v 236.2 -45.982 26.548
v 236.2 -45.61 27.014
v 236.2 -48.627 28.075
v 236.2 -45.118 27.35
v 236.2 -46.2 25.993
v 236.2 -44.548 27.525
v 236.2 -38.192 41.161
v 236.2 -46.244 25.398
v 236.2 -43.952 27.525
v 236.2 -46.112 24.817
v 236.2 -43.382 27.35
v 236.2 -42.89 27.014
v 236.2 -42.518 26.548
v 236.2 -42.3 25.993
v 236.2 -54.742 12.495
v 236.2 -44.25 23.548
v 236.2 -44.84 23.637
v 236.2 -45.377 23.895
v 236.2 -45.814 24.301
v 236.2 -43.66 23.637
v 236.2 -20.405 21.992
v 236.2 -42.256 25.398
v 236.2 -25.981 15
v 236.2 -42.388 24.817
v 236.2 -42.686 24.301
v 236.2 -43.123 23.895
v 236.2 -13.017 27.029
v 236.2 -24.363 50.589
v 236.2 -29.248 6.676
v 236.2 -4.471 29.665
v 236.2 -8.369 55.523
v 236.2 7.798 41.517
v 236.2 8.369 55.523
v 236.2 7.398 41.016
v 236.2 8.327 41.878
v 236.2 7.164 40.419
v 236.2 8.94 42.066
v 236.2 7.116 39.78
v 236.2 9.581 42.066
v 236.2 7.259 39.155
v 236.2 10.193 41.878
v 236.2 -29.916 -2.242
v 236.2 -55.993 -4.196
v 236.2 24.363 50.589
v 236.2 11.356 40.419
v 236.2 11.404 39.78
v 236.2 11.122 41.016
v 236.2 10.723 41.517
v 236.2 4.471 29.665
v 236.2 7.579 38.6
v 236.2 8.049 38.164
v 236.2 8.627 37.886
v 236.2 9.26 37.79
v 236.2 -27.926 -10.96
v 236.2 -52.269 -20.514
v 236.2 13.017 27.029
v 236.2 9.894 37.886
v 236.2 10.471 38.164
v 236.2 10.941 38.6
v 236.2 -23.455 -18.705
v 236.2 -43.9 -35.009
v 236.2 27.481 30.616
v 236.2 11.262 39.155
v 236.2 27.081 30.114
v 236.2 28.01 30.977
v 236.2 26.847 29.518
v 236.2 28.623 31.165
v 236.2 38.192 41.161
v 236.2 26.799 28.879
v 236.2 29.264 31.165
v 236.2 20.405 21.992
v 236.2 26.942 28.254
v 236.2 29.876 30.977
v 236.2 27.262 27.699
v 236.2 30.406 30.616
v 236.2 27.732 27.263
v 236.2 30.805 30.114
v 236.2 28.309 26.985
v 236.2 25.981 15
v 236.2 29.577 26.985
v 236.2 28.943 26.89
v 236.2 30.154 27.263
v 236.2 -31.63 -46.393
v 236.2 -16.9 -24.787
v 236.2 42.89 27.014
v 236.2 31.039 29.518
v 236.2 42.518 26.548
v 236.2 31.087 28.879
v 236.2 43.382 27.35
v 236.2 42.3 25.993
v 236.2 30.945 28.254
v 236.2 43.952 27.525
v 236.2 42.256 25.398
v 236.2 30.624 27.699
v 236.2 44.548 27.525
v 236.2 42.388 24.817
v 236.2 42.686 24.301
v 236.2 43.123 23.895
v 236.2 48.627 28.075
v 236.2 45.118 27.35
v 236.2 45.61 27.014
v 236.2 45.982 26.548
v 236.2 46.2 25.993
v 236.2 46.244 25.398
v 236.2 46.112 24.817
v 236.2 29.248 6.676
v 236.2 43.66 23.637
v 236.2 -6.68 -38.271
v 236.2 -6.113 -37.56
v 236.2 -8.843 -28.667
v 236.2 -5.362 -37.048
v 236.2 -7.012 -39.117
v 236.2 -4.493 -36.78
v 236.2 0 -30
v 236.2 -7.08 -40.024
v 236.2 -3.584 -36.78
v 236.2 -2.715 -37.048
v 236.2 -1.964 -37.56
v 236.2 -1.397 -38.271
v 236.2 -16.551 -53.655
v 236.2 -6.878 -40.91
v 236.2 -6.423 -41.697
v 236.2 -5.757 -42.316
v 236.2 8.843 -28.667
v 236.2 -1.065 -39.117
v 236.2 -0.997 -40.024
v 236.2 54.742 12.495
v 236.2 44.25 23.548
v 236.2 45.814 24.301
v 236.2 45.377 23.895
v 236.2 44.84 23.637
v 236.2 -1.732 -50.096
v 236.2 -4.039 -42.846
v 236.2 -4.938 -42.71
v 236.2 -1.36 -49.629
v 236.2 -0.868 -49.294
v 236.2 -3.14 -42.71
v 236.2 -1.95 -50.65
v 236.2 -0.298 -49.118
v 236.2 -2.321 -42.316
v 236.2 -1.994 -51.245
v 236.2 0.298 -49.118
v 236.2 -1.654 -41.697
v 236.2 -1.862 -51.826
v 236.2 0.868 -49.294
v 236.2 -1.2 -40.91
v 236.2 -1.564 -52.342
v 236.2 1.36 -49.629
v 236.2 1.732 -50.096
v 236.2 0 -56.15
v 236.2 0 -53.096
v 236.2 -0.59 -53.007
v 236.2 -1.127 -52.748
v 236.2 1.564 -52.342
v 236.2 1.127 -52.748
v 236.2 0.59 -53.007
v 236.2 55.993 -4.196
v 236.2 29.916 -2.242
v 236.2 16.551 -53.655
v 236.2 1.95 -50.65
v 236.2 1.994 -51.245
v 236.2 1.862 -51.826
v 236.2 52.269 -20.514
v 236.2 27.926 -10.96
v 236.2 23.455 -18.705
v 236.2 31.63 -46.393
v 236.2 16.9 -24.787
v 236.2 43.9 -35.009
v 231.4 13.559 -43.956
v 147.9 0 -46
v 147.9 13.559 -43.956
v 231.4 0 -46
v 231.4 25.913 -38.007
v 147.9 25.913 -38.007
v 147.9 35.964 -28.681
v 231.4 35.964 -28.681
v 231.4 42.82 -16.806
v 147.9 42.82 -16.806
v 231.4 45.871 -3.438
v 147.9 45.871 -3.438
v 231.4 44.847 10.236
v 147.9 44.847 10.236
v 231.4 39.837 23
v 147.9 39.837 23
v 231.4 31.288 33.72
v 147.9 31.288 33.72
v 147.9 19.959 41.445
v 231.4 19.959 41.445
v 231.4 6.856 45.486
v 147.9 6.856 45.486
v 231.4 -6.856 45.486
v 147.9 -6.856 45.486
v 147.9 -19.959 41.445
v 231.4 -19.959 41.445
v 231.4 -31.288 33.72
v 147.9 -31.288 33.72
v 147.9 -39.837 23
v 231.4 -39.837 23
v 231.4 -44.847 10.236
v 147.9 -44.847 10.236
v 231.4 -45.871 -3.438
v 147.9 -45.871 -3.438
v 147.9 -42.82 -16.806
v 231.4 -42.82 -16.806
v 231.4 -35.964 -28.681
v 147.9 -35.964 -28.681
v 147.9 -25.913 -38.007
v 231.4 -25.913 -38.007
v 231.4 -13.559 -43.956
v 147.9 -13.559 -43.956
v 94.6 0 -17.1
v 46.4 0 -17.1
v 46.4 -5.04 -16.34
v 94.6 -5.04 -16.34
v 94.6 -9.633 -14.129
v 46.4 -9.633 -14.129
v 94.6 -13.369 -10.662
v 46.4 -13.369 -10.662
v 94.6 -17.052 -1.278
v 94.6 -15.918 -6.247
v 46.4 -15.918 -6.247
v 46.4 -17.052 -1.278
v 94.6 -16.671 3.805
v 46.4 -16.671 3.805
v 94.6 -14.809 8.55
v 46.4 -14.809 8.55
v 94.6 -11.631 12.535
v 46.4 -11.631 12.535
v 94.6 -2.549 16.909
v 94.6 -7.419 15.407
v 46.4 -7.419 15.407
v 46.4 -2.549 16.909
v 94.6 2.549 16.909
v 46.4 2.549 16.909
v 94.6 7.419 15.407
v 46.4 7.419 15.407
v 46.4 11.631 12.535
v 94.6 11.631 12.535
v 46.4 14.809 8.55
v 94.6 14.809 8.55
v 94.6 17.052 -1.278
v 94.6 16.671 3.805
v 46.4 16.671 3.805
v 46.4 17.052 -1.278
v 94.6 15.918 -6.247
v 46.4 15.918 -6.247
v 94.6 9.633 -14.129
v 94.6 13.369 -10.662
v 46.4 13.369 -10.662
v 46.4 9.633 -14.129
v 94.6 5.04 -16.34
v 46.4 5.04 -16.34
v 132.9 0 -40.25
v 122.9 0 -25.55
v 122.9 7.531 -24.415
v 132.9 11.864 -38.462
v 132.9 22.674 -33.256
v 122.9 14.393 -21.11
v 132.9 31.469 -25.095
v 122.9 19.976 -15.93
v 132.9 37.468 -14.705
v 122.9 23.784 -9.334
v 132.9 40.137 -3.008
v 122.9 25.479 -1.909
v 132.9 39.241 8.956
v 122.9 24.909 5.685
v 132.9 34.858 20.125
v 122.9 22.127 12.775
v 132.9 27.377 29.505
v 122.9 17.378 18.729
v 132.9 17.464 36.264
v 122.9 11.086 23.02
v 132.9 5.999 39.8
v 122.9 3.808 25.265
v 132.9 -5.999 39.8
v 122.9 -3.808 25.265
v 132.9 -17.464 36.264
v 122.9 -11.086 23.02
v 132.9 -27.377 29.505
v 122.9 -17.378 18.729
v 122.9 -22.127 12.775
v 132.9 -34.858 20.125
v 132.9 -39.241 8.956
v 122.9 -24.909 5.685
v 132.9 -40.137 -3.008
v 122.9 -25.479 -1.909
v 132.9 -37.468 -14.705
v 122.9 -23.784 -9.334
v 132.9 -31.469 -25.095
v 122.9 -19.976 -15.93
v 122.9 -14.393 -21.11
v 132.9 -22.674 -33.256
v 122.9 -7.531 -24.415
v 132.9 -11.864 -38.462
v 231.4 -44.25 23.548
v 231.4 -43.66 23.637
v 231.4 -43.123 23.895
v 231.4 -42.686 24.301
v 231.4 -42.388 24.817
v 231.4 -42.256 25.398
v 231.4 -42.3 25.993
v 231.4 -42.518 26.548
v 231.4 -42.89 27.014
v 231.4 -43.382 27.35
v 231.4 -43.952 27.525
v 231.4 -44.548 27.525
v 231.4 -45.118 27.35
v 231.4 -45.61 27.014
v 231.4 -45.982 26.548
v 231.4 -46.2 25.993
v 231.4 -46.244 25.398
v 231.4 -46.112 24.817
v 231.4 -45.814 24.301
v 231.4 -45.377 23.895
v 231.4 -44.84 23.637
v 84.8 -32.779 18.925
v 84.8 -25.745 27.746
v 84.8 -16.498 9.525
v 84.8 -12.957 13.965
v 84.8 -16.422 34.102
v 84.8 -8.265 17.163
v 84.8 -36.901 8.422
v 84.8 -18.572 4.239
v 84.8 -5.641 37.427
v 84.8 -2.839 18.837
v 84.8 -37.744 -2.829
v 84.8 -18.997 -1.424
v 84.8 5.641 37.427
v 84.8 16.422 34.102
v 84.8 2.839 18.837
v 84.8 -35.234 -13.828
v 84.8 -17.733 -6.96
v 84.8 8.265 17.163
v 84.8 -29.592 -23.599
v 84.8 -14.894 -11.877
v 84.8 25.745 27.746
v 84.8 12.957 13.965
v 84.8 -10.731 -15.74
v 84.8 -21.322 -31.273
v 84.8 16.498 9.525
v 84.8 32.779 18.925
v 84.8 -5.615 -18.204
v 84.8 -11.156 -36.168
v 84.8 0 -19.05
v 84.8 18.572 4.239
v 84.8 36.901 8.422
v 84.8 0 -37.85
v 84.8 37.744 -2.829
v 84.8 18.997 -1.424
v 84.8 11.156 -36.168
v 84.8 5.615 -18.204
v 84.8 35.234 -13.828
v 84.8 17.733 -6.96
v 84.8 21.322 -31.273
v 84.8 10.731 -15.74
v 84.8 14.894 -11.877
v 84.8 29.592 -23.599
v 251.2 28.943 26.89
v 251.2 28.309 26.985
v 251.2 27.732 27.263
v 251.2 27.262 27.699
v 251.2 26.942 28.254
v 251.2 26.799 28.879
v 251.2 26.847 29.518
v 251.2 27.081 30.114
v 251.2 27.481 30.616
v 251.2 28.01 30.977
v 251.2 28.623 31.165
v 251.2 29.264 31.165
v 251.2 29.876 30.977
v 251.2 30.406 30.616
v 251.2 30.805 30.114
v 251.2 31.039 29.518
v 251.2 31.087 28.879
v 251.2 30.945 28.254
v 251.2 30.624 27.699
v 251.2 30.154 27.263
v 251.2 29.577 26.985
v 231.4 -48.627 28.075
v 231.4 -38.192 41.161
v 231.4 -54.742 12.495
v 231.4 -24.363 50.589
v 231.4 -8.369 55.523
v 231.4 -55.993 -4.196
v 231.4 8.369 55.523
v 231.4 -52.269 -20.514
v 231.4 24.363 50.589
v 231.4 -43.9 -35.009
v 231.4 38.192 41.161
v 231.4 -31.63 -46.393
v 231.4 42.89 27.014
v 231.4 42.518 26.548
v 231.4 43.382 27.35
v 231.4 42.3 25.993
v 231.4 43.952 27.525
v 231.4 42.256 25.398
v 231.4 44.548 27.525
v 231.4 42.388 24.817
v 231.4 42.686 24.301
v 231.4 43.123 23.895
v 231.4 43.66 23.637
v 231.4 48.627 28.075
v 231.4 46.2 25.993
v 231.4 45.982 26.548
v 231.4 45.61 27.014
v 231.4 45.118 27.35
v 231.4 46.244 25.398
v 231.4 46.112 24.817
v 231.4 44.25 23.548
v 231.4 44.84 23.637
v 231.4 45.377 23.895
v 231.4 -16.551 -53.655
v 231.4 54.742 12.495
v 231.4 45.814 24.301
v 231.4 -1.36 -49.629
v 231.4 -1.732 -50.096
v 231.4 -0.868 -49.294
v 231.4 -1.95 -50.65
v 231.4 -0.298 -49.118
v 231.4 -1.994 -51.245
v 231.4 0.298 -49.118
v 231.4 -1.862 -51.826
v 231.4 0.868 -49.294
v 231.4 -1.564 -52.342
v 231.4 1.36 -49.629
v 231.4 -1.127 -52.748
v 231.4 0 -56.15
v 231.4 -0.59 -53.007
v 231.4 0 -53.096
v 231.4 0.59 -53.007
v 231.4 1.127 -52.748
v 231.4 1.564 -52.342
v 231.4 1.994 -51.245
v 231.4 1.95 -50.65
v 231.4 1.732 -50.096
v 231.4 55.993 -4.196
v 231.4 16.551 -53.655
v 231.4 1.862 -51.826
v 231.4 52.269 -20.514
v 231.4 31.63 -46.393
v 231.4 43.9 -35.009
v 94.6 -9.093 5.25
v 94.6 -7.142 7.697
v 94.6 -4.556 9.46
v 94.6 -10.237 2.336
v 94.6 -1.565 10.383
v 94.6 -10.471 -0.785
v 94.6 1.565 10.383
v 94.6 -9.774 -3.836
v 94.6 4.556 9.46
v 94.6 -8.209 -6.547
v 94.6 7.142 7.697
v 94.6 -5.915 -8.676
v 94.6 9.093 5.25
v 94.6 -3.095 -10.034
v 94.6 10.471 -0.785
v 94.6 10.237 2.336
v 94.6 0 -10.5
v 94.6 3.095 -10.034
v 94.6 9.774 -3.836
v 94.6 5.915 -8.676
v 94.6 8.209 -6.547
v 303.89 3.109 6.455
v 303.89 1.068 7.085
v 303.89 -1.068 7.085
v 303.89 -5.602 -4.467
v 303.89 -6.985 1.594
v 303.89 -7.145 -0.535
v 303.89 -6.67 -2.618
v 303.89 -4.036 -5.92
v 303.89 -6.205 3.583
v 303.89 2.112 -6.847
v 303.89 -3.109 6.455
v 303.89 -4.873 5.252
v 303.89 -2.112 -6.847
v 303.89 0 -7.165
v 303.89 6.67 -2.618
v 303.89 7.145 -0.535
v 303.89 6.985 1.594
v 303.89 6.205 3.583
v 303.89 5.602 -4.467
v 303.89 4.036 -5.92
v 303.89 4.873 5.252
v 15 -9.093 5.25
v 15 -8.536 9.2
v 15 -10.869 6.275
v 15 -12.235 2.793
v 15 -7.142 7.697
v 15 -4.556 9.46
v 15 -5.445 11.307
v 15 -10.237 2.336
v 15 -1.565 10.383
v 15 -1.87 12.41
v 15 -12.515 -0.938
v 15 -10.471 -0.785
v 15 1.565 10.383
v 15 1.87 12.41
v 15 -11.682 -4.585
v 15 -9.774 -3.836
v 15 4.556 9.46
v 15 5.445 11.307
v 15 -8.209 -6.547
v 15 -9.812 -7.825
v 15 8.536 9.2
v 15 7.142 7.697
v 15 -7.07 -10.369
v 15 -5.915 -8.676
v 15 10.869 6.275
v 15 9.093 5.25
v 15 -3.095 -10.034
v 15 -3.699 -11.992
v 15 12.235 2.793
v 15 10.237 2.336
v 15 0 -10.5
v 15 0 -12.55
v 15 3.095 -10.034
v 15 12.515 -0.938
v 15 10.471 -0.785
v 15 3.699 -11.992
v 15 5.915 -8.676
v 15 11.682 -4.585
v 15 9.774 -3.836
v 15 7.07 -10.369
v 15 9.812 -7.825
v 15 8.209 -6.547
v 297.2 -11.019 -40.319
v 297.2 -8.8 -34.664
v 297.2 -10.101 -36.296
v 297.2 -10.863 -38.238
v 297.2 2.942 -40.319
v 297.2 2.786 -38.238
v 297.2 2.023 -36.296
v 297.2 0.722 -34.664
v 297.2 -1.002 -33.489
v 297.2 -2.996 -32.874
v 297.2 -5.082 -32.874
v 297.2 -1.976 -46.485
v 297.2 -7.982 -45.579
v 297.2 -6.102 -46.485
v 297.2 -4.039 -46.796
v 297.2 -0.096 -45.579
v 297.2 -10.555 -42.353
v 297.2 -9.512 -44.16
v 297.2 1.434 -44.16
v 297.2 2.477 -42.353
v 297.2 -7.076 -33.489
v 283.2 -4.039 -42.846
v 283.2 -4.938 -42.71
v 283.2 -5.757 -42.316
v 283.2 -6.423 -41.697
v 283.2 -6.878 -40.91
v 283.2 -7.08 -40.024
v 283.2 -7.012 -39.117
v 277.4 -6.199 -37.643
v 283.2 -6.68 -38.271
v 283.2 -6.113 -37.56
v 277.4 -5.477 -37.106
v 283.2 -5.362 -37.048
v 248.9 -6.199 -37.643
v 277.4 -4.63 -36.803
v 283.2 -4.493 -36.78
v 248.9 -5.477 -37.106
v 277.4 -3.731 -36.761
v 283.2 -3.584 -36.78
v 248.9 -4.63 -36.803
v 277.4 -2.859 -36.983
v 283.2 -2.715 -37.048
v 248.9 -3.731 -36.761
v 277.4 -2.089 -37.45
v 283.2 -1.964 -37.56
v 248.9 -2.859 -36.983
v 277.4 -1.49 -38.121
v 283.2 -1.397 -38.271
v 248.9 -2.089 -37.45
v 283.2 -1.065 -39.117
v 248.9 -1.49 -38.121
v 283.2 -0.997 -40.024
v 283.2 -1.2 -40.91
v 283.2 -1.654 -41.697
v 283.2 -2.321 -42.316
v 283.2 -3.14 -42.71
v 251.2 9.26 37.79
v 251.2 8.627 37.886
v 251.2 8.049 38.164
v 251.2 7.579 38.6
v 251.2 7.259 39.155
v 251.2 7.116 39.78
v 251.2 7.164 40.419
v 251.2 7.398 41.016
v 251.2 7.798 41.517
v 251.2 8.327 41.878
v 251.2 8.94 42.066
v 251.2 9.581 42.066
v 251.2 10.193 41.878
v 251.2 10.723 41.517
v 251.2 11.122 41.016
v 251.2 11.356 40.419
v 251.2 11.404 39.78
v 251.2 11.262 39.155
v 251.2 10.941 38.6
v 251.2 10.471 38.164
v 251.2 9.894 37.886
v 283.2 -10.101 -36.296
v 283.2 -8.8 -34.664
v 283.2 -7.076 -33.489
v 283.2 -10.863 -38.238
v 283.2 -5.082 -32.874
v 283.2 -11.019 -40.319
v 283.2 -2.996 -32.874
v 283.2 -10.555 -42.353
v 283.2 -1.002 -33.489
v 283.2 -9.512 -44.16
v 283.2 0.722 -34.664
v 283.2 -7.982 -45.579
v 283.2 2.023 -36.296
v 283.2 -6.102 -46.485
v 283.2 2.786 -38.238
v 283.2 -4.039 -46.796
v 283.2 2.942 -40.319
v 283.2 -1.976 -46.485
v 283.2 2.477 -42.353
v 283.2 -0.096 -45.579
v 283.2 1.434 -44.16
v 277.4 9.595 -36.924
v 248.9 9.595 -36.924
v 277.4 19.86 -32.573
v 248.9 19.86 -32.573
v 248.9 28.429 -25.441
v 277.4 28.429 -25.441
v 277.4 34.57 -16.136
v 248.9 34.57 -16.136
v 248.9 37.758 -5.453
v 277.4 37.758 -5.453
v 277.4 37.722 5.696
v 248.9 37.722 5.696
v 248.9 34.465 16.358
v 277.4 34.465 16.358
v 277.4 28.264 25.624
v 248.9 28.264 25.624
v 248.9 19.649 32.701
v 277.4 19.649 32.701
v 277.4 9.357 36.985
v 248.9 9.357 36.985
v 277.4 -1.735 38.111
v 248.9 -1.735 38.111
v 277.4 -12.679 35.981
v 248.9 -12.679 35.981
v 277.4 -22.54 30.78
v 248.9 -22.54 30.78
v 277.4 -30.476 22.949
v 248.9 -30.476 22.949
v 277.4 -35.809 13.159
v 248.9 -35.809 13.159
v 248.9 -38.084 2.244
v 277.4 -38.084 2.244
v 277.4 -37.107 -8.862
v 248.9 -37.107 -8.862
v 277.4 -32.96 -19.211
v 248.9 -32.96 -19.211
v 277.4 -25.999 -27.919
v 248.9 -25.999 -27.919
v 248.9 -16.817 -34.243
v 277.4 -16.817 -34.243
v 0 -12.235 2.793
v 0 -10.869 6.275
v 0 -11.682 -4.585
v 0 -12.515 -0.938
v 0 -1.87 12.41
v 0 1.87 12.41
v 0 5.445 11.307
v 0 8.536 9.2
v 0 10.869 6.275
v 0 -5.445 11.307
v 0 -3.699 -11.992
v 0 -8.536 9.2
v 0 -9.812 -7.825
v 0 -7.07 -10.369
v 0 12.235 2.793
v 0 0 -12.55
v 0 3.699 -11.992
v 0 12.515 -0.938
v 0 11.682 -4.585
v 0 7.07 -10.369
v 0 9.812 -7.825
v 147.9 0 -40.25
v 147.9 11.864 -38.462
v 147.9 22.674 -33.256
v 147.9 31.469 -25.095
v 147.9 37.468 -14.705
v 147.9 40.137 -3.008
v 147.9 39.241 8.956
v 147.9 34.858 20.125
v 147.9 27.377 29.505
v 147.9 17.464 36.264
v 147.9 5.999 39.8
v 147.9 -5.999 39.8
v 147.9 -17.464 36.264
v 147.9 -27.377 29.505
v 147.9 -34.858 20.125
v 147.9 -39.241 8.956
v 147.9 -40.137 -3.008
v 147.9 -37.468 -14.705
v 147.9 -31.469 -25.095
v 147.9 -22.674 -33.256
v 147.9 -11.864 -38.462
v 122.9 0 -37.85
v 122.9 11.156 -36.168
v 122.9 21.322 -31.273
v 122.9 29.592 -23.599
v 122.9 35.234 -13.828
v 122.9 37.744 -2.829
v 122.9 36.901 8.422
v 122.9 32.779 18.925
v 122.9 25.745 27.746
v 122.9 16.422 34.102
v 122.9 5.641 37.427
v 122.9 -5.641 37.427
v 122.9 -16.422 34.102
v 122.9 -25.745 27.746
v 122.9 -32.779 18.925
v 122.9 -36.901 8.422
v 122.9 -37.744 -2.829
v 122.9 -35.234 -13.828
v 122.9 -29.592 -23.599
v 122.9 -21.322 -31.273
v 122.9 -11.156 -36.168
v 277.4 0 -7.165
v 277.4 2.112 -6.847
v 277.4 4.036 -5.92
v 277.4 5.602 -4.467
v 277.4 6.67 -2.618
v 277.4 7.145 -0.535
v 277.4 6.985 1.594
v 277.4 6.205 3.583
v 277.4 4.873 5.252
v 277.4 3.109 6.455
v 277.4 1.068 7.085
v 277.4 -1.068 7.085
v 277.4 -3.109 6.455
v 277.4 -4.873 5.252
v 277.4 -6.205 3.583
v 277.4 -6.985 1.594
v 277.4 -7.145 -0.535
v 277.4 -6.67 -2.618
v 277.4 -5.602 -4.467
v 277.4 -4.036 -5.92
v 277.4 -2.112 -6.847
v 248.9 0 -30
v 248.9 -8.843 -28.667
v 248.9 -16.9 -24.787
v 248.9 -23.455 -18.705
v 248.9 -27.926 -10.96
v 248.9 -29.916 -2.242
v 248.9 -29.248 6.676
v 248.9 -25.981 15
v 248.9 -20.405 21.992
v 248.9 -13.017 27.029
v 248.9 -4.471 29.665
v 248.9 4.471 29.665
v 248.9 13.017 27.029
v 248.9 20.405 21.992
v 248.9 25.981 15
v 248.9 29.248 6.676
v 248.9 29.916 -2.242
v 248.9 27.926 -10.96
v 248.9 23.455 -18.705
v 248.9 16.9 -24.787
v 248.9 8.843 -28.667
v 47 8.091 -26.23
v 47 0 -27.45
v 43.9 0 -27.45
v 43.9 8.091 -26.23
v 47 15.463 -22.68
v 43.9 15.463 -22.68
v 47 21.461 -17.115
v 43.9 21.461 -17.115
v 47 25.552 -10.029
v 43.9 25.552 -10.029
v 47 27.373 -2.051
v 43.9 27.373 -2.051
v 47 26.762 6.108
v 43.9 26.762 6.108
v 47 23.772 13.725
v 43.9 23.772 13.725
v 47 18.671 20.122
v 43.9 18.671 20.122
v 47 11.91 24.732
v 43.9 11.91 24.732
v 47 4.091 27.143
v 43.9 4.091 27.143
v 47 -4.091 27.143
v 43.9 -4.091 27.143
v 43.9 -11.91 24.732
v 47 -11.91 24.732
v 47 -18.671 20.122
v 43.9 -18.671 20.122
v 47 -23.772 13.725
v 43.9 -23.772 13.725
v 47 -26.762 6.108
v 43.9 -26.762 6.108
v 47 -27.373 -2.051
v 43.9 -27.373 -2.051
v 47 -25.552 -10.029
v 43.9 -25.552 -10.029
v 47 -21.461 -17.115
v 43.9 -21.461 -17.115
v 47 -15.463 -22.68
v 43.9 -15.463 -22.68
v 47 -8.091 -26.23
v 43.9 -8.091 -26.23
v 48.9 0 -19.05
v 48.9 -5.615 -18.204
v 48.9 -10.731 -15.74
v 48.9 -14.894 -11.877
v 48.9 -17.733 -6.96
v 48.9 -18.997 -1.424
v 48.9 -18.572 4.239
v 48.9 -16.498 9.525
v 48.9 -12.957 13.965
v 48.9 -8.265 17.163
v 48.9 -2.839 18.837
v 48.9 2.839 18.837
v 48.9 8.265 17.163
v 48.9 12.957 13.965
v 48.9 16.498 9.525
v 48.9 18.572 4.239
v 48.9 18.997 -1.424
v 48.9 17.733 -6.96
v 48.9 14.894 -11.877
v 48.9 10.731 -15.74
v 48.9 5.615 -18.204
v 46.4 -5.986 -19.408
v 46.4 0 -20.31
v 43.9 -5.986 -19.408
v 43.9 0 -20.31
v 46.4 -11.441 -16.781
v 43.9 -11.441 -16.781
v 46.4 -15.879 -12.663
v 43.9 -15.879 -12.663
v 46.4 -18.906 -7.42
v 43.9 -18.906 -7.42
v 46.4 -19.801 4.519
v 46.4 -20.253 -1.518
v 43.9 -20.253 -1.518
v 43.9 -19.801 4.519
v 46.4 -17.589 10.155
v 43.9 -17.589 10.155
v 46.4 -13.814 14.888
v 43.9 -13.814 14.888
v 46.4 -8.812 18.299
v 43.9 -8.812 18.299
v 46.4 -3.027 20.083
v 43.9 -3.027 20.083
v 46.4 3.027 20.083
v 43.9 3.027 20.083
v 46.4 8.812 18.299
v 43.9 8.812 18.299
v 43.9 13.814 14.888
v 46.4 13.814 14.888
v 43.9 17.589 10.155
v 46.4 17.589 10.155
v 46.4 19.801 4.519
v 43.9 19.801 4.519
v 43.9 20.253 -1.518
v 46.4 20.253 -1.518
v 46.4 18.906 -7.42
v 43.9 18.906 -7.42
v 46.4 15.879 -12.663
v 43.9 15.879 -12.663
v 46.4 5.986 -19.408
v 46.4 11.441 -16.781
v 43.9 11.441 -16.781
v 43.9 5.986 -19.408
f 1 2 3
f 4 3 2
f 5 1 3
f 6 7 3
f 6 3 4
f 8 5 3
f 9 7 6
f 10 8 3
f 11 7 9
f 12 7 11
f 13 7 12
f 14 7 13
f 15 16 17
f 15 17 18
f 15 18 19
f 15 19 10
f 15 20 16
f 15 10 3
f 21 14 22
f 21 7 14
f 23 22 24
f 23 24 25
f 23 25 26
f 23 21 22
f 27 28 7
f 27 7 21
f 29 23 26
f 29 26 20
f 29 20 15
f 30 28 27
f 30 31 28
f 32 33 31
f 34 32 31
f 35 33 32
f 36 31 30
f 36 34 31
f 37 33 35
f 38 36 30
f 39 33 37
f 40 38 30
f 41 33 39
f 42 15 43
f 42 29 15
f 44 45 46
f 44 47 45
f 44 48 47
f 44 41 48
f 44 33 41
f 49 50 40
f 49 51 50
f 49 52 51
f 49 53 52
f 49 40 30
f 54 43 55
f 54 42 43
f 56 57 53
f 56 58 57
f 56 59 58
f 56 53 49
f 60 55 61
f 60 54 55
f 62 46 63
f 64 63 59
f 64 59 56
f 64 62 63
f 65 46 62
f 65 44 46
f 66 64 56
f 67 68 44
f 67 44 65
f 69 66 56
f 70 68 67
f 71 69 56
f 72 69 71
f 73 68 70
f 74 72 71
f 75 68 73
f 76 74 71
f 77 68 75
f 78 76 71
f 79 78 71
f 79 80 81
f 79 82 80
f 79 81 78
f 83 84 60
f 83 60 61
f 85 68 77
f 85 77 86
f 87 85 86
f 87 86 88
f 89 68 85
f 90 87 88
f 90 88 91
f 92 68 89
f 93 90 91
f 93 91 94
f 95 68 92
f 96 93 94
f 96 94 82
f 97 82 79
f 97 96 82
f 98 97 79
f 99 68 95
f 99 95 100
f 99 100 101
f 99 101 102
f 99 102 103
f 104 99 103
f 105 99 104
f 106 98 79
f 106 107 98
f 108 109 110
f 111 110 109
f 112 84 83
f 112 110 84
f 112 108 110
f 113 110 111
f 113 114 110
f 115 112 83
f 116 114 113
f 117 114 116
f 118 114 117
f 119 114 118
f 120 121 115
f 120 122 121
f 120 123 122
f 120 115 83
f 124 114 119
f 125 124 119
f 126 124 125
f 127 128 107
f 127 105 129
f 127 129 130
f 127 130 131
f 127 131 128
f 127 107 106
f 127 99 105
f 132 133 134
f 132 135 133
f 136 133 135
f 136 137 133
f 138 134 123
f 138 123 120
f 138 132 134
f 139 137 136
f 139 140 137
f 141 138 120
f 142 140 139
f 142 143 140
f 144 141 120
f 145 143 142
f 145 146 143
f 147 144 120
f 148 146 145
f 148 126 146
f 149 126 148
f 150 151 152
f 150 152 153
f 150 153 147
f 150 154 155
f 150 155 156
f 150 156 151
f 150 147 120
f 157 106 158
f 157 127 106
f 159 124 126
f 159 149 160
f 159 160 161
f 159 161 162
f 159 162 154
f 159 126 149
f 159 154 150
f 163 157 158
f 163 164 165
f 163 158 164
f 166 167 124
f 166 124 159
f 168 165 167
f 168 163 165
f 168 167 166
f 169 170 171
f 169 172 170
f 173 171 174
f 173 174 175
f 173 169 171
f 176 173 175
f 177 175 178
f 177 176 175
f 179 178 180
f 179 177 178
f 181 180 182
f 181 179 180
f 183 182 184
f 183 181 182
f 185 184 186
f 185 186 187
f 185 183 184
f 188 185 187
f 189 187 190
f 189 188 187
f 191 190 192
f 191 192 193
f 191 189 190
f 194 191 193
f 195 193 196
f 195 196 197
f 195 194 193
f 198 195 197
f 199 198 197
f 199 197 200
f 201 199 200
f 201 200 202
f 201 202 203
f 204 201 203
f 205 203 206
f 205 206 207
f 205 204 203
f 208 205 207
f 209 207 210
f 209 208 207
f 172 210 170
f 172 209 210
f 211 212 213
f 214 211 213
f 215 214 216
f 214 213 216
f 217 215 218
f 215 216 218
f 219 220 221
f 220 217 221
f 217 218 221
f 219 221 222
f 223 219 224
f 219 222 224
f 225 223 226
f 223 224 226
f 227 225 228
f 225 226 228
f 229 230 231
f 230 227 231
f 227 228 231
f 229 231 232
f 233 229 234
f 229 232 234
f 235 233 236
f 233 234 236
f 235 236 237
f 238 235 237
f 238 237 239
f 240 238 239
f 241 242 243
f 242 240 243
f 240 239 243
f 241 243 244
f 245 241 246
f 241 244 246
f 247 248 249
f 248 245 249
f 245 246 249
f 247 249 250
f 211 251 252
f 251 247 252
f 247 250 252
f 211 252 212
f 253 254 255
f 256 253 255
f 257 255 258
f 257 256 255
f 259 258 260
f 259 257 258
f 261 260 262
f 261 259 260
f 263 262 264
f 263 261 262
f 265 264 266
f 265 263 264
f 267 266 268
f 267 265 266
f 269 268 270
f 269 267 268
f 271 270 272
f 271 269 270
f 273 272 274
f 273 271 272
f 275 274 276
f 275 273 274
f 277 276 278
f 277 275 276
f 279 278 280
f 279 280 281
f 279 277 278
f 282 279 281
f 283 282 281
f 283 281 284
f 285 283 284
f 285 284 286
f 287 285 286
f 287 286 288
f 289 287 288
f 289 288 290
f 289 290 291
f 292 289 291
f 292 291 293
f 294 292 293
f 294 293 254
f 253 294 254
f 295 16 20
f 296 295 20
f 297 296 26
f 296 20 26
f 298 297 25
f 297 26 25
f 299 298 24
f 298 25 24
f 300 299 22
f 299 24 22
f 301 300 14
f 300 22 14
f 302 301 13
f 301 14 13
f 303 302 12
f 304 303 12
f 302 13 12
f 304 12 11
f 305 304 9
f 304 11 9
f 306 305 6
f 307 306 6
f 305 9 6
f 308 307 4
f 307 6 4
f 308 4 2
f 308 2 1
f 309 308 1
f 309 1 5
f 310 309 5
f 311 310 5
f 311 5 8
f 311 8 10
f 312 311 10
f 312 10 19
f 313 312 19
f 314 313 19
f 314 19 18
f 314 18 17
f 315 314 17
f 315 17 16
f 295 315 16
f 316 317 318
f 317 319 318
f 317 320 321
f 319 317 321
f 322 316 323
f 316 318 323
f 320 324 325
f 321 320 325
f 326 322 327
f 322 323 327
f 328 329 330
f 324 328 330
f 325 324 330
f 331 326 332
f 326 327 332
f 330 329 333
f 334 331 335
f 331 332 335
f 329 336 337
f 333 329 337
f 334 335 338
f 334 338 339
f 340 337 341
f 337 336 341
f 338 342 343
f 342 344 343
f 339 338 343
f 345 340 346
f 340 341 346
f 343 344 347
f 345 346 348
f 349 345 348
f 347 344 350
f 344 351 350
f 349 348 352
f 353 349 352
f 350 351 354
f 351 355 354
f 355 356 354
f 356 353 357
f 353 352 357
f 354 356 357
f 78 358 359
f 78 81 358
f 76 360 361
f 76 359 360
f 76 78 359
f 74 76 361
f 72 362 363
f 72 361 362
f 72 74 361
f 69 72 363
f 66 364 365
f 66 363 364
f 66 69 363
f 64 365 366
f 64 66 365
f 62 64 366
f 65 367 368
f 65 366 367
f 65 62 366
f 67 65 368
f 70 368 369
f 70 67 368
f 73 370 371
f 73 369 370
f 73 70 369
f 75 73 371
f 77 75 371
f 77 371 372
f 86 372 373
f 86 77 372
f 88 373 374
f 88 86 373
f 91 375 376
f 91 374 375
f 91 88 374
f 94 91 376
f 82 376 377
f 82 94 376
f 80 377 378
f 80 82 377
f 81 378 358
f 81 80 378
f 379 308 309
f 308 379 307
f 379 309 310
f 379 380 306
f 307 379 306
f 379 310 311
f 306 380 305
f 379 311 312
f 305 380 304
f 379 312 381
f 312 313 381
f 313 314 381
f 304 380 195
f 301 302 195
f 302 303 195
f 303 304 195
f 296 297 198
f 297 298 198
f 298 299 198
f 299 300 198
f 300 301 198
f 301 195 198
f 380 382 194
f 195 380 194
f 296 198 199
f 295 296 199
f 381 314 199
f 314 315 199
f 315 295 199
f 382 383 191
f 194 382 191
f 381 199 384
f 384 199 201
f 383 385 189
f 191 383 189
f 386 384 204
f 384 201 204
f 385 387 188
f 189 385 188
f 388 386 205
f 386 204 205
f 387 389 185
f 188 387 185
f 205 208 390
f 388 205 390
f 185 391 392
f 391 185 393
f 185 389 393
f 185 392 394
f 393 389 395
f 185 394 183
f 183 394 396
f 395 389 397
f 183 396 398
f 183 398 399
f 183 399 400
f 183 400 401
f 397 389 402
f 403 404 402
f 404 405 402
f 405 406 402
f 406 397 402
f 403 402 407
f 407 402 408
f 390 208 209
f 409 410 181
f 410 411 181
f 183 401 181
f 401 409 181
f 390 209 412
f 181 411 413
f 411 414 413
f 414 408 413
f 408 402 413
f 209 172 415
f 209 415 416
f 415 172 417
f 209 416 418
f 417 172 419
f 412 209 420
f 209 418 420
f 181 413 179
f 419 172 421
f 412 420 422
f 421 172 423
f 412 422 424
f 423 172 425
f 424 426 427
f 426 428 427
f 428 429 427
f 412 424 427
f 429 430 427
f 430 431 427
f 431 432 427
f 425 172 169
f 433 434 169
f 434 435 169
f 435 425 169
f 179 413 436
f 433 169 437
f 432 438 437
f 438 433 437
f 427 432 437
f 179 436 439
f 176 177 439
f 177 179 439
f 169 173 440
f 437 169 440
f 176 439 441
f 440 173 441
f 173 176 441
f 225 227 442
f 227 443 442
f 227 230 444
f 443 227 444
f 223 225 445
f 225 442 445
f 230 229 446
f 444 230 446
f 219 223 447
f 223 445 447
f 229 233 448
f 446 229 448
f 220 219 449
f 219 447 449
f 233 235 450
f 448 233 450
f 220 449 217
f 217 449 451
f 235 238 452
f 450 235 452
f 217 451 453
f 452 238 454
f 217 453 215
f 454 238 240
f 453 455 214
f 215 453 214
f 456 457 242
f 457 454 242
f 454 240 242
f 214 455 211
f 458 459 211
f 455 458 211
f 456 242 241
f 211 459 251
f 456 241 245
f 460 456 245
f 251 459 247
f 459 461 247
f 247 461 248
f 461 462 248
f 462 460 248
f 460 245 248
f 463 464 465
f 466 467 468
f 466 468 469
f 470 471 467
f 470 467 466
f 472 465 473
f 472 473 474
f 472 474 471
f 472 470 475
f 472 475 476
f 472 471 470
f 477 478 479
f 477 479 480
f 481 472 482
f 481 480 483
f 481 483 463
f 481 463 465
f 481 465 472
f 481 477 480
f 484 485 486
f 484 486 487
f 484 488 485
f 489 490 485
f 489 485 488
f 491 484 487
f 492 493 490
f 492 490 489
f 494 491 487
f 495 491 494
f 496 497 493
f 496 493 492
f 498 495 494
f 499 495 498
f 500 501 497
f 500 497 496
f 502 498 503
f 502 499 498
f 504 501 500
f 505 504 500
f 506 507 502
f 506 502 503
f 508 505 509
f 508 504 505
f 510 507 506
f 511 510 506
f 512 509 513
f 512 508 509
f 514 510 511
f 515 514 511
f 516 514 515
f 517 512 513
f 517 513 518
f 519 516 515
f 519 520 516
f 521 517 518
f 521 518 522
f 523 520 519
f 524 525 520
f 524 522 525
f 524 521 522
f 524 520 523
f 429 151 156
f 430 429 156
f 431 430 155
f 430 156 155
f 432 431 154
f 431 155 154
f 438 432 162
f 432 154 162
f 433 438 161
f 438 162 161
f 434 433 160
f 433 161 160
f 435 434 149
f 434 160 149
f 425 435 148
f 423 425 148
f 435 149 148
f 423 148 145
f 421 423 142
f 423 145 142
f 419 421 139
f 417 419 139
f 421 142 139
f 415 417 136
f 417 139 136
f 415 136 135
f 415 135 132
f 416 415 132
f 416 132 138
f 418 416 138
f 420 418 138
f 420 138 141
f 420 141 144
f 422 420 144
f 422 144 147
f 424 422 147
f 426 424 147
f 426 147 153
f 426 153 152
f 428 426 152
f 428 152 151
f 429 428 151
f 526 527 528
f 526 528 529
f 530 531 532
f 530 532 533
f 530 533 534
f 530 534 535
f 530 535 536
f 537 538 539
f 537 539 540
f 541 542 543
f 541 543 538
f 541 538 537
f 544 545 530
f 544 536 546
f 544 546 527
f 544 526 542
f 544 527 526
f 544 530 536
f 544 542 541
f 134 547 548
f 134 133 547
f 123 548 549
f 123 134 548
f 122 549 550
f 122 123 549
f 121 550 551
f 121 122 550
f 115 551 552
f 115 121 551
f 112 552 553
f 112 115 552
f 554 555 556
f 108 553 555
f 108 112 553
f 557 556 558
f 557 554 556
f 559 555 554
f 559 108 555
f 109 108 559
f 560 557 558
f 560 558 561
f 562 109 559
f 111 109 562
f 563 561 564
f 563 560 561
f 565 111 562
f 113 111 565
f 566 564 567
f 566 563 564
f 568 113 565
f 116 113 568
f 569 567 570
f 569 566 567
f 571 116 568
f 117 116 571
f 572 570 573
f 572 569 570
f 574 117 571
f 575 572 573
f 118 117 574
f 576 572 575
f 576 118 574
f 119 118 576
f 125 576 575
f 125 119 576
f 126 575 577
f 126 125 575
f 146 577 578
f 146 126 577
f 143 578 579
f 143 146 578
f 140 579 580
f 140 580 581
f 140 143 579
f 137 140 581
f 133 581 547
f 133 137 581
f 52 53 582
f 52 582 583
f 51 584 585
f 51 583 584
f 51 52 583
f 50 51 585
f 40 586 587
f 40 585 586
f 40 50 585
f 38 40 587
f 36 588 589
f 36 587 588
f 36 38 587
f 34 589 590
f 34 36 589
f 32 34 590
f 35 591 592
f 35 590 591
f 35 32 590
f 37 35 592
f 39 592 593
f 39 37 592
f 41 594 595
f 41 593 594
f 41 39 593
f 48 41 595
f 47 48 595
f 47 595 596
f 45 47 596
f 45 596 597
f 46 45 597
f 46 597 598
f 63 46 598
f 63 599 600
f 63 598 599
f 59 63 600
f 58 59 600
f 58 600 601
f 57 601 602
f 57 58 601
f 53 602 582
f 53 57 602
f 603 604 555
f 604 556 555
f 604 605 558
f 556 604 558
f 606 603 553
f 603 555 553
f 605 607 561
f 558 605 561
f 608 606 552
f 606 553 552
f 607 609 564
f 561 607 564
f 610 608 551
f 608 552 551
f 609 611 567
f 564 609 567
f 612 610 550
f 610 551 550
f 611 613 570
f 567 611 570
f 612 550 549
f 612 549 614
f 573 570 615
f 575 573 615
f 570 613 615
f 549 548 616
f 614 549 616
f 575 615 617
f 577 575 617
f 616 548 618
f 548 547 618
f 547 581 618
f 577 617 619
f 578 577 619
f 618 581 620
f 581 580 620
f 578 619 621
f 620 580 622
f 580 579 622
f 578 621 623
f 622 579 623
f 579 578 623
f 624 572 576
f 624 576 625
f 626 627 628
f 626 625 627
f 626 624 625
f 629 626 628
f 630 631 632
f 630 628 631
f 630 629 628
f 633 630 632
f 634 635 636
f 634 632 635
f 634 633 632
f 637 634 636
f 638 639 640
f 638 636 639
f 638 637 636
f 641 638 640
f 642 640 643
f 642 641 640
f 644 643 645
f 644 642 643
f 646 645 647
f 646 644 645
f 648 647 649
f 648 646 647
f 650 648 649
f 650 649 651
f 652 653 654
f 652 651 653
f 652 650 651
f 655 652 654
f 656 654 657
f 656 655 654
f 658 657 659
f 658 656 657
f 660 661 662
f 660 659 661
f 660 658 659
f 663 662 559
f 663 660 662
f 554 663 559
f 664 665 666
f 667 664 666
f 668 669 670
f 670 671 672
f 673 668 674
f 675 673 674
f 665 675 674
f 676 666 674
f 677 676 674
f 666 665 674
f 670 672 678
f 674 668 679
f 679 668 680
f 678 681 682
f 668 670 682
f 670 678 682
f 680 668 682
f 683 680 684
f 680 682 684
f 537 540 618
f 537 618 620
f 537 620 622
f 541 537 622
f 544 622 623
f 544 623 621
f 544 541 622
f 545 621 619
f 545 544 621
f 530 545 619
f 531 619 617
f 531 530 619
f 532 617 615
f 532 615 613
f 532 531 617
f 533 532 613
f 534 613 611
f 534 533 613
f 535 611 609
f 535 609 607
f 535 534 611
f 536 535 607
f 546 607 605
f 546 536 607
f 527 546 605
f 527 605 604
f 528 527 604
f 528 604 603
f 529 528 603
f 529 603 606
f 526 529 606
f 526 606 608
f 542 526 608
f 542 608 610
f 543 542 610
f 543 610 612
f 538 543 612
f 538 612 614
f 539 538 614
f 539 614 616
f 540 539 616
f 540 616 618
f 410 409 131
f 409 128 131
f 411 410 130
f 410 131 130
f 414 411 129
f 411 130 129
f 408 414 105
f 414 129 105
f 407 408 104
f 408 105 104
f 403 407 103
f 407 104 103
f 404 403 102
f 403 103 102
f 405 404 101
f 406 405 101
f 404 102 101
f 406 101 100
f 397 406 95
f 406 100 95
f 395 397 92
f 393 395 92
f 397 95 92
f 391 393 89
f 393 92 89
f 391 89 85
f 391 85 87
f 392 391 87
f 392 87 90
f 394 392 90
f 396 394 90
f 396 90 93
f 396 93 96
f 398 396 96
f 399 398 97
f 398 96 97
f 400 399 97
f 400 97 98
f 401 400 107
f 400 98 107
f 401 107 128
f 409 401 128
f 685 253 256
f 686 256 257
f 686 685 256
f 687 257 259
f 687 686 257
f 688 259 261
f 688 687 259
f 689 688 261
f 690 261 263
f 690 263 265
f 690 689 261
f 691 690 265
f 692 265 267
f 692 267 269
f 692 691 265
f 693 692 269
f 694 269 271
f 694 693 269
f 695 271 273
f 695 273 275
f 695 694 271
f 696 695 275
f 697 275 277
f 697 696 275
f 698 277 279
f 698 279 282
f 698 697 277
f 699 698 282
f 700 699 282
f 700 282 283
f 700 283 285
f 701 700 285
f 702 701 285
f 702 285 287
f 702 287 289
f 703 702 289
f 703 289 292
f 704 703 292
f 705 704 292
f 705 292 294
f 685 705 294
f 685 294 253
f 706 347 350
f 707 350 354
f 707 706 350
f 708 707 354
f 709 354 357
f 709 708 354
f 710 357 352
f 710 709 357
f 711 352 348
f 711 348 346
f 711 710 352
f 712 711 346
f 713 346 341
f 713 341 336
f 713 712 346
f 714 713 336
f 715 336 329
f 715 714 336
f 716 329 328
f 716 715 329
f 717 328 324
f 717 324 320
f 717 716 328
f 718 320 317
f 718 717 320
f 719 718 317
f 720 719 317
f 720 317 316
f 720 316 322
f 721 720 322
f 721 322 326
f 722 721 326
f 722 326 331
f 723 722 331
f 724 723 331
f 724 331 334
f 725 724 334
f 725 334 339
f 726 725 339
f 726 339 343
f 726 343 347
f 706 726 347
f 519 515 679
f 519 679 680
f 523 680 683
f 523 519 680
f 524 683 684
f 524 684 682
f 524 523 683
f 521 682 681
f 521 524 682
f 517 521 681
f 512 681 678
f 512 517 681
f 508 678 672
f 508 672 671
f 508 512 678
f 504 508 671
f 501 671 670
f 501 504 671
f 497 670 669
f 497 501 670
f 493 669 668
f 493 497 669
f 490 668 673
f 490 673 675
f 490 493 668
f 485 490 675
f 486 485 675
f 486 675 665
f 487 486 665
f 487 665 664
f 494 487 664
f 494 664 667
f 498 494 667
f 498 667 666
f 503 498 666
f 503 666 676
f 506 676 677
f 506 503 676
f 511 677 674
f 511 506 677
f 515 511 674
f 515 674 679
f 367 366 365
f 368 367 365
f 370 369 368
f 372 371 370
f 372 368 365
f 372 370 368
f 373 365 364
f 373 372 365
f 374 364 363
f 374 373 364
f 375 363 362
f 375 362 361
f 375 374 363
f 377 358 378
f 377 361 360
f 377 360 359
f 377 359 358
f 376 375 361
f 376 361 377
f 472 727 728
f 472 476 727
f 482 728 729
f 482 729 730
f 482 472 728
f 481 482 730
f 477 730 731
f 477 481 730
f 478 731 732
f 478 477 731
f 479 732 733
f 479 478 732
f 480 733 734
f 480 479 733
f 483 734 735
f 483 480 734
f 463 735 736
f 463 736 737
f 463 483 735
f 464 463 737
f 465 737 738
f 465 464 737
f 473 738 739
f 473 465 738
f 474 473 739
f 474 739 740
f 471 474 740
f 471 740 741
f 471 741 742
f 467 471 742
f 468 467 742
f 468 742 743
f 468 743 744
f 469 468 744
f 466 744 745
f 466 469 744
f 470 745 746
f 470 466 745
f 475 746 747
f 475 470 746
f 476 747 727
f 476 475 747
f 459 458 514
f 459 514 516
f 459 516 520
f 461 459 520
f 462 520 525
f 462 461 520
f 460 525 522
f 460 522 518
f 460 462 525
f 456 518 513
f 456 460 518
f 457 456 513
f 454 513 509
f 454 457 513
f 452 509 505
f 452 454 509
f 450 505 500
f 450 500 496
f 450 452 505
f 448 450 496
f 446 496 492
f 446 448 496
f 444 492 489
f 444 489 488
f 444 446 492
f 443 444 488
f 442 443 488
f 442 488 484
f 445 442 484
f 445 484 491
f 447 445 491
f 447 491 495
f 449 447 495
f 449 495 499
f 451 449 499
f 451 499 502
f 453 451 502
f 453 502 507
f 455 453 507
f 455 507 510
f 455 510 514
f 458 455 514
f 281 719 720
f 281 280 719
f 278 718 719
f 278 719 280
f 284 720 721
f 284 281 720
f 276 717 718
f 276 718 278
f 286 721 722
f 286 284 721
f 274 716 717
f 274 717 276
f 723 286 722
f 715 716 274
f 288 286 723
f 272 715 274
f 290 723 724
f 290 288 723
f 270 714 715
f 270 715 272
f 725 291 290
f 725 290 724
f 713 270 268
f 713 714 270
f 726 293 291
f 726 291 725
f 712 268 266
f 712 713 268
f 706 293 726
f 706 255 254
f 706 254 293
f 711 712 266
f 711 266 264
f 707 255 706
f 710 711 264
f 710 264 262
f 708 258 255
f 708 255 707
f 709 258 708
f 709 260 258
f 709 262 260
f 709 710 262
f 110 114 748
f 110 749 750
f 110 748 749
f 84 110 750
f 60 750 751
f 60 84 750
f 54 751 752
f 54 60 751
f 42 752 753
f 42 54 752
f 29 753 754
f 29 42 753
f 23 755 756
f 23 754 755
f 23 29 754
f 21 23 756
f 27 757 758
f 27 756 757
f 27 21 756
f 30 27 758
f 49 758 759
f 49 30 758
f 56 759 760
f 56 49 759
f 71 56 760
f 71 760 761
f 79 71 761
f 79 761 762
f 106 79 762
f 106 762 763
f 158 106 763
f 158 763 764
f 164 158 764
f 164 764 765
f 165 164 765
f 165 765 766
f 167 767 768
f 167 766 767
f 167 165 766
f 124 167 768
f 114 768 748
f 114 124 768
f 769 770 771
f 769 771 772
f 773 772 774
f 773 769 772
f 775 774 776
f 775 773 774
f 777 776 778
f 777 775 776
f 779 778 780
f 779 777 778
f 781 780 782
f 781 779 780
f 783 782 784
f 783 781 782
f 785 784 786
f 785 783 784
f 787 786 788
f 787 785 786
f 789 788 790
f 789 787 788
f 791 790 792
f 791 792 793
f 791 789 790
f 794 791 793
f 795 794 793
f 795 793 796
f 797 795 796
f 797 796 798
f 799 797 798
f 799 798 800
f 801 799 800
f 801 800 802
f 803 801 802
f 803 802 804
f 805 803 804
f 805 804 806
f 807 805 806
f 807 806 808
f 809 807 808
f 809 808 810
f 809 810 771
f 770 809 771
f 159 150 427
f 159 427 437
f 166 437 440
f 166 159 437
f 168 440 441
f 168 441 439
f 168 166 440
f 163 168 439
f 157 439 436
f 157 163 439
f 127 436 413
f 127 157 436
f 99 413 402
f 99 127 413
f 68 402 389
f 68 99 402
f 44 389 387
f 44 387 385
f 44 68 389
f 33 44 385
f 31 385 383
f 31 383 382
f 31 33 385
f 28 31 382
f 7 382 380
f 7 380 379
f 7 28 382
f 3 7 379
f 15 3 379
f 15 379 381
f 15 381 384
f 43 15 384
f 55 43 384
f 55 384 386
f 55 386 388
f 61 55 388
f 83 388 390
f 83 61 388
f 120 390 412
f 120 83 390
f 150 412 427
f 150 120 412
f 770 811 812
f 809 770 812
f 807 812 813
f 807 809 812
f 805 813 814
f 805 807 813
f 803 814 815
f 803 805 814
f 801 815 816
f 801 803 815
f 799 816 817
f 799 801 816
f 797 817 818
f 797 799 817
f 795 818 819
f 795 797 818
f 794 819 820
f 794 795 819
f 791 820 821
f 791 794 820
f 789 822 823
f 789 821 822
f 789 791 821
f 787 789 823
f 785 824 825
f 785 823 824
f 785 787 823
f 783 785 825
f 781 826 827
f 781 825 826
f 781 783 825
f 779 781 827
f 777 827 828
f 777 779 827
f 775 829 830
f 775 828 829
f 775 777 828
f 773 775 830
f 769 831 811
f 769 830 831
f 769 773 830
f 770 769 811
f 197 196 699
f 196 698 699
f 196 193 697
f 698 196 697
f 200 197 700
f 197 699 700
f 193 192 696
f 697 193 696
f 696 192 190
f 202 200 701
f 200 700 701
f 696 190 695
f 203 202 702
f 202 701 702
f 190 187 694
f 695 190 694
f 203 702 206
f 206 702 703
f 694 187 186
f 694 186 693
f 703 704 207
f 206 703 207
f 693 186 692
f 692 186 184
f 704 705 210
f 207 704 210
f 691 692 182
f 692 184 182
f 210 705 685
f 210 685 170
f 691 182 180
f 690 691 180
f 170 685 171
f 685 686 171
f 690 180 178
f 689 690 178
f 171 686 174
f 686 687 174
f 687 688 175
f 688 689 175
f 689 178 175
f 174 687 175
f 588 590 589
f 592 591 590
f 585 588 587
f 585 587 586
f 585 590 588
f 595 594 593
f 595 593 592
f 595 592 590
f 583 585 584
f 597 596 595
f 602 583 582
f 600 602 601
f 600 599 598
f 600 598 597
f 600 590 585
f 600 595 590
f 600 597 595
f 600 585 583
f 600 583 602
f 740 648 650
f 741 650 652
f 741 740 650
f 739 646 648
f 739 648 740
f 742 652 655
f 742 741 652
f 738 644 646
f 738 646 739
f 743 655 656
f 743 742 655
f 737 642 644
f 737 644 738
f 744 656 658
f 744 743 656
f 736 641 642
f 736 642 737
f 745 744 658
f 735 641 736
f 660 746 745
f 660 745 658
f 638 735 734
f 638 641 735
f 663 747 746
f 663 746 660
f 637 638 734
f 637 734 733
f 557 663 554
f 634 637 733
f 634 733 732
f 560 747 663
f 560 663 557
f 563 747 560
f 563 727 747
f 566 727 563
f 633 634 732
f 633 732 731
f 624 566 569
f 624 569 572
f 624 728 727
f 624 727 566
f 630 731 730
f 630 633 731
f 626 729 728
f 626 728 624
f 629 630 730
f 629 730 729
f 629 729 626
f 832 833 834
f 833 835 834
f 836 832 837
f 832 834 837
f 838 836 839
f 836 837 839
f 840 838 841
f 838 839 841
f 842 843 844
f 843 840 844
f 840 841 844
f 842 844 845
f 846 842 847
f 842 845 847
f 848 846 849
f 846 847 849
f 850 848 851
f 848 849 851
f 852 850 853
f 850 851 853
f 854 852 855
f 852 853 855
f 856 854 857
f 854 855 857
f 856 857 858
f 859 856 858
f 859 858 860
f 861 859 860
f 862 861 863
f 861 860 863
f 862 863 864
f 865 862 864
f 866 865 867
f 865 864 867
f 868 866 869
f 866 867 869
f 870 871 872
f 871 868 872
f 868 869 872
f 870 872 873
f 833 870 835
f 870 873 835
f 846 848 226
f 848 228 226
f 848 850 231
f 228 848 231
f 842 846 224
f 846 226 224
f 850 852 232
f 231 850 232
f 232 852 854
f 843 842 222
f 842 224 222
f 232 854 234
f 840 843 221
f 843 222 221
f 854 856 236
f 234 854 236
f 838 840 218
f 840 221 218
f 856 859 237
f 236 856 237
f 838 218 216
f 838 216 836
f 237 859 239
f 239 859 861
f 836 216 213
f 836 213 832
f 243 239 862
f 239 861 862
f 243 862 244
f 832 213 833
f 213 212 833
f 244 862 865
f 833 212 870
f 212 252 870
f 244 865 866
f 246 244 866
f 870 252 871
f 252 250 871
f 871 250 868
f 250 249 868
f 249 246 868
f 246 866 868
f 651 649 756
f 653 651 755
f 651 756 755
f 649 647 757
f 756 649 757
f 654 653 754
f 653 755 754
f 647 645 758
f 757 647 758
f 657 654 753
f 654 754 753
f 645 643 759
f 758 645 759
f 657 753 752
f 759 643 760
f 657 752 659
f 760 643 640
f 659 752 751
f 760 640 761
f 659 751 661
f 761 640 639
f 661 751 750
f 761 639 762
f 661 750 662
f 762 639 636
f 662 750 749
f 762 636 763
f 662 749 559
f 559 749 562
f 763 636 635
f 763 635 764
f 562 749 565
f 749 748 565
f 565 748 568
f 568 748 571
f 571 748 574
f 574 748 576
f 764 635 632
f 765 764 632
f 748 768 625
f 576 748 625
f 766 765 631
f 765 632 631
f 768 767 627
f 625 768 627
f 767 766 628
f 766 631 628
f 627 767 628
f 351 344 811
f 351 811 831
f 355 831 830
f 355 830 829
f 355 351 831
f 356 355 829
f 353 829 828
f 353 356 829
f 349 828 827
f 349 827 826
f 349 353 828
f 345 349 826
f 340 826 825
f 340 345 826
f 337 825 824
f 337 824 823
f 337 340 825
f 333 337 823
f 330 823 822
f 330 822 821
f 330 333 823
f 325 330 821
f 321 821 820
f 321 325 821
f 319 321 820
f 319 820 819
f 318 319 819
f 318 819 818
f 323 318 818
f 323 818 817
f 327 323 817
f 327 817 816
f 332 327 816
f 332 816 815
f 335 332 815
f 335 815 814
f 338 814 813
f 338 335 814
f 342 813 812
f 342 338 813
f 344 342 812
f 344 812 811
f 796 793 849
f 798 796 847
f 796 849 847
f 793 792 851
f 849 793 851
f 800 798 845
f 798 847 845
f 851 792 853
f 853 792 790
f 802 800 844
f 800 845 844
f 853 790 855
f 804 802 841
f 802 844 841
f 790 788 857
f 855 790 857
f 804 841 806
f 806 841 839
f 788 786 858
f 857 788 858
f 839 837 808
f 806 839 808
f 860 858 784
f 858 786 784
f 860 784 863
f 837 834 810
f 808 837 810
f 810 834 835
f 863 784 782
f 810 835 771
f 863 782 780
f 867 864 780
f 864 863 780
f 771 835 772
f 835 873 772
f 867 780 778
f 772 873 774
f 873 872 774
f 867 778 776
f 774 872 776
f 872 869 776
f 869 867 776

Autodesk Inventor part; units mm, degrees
ref_plane "YZ Plane" through (0, 0, 0) normal (1, 0, 0) x (0, 1, 0)
ref_plane "XZ Plane" through (0, 0, 0) normal (0, 1, 0) x (-1, 0, 0)
ref_plane "XY Plane" through (0, 0, 0) normal (0, 0, 1) x (1, 0, 0)
sketch "Sketch1" plane through (0, 0, 0) normal (0, 1, 0) x (-1, 0, 0)
  line L0 (0, 0) -> (-303.89, 0)
  line L1 (0, 0) -> (0, -10.5)
  line L2 (0, -10.5) -> (-94.6, -10.5)
  line L3 (-94.6, -10.5) -> (-94.6, -17.1)
  line L4 (-94.6, -17.1) -> (-46.4, -17.1)
  line L5 (-46.4, -17.1) -> (-46.4, -20.31)
  line L6 (-46.4, -20.31) -> (-43.9, -20.31)
  line L7 (-43.9, -20.31) -> (-43.9, -27.45)
  line L8 (-43.9, -27.45) -> (-47, -27.45)
  line L9 (-47, -27.45) -> (-48.9, -19.05)
  line L10 (-48.9, -19.05) -> (-84.8, -19.05)
  line L11 (-84.8, -19.05) -> (-84.8, -37.85)
  line L12 (-84.8, -37.85) -> (-122.9, -37.85)
  line L13 (-122.9, -37.85) -> (-122.9, -25.55)
  line L14 (-122.9, -25.55) -> (-132.9, -40.25)
  line L15 (-132.9, -40.25) -> (-132.9, -40.25)
  line L16 (-132.9, -40.25) -> (-147.9, -40.25)
  line L17 (-147.9, -40.25) -> (-147.9, -46)
  line L18 (-147.9, -46) -> (-150, -46)
  line L19 (-150, -46) -> (-150, -46)
  line L20 (-150, -46) -> (-231.4, -46)
  line L21 (-231.4, -46) -> (-231.4, -56.15)
  line L22 (-231.4, -56.15) -> (-236.2, -56.15)
  line L23 (-236.2, -56.15) -> (-236.2, 0)
  line L24 (-248.9, 0) -> (-248.9, -38.15)
  line L25 (-248.9, -38.15) -> (-277.4, -38.15)
  line L26 (-277.4, -38.15) -> (-277.4, -7.165)
  line L27 (-277.4, -7.165) -> (-303.89, -7.165)
  line L28 (-303.89, -7.165) -> (-303.89, 0)
  line L29 (0, -10.5) -> (0, -12.55)
  line L30 (0, -12.55) -> (-15, -12.55)
  line L31 (-15, -12.55) -> (-15, -10.5)
  line L32 (-236.2, 0) -> (-248.9, 0)
  line L33 (-248.9, 0) -> (-248.9, -30)
  line L34 (-248.9, -30) -> (-236.2, -30)
  line L35 (-236.2, -30) -> (-236.2, 0)
  dimension "d0" = 303.89
  dimension "d1" = 10.5
  dimension "d2" = 94.6
  dimension "d3" = 6.6
  dimension "d4" = 48.2
  dimension "d5" = 3.21
  dimension "d6" = 2.5
  dimension "d7" = 27.45
  dimension "d8" = 3.1
  dimension "d9" = 5
  dimension "d10" = 19.05
  dimension "d11" = 37.8
  dimension "d12" = 37.85
  dimension "d13" = 38.1
  dimension "d14" = 12.3
  dimension "d16" = 10
  dimension "d17" = 40.25
  dimension "d18" = 40.25
  dimension "d19" = 15
  dimension "d20" = 46
  dimension "d21" = 2.1
  dimension "d22" = 46
  dimension "d23" = 98.5
  dimension "d24" = 56.15
  dimension "d25" = 103.3
  dimension "d26" = 12.7
  dimension "d27" = 144.5
  dimension "d28" = 38.15
  dimension "d29" = 90
  dimension "d30" = 7.165
  dimension "d31" = 26.49
  dimension "d54" = 15
  dimension "d55" = 12.55
  dimension "d56" = 30
revolve "Revolution1" add sketch "Sketch1" angle 360 about axis through (0, 0, 0) along (1, 0, 0)
sketch "Sketch6" plane through (236.2, 0, 0) normal (1, 0, 0) x (0, 0, -1)
  line L0 (-25.5477, -44.25) -> (-25.5477, 44.25)
  line L1 (-25.5477, 44.25) -> (51.0955, 0)
  line L2 (51.0955, 0) -> (-25.5477, -44.25)
  circle A0 centre (51.0955, 0) radius 2
  circle A1 centre (-25.5477, -44.25) radius 2
  circle A2 centre (-25.5477, 44.25) radius 2
  point P0 (0, 0)
  point P1 (0, 0)
  dimension "d57" = 4
  dimension "d58" = 88.5
extrude "Extrusion3" cut sketch "Sketch6" against normal up to surface (4.8 mm away) contours L2 A1 L0 | L0 A1 L2 | A2 L1 L0 | L0 L1 A2 | A0 L1 L2 | L2 L1 A0
sketch "Sketch7" plane through (236.2, 0, 0) normal (1, 0, 0) x (0, 0, -1)
  circle A0 centre (0, 0) radius 30 projected
  circle A1 centre (0, 0) radius 41 construction
  circle A2 centre (-29.0395, 28.9432) radius 2.15
  circle A3 centre (-39.9405, 9.2603) radius 2.15
  circle A4 centre (-25.5477, 44.25) radius 2 projected
  dimension "d61" = 11
  dimension "d62" = 4.3
  dimension "d63" = 22.5
  dimension "d64" = 15.7
extrude "Extrusion4" add sketch "Sketch7" along normal blind 15 contours A2 | A3
sketch "Sketch8" plane through (236.2, 0, 0) normal (1, 0, 0) x (0, 0, -1)
  circle A0 centre (0, 0) radius 30 projected
  circle A1 centre (0, 0) radius 40 construction
  circle A2 centre (39.7956, -4.0388) radius 3.05
  circle A3 centre (51.0955, 0) radius 2 projected
  dimension "d67" = 10
  dimension "d68" = 6.1
  dimension "d69" = 12
extrude "Extrusion5" add sketch "Sketch8" along normal blind 61 contours A2
sketch "Sketch9" plane through (297.2, -4.0388, -39.7956) normal (1, 0, 0) x (0, 0, -1)
  circle A0 centre (0, 0) radius 3.05 projected
  circle A1 centre (0, 0) radius 7
  point P0 (-39.7956, 4.0388)
  dimension "d72" = 14
extrude "Extrusion6" add sketch "Sketch9" against normal blind 14 contours A0 | A1
properties part number "STI NGC Cryocooler"
